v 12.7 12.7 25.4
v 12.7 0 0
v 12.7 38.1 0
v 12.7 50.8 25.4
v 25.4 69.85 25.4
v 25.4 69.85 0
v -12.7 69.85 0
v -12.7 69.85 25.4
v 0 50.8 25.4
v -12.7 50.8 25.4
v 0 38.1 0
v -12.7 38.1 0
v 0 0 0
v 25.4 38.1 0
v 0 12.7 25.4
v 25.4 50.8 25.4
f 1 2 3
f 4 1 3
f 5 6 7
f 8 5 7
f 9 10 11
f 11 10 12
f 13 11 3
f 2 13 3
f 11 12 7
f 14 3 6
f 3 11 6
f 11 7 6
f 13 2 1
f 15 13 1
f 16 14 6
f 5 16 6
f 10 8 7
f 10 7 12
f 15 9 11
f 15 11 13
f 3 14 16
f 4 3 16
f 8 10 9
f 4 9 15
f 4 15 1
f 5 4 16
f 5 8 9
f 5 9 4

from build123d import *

# Parameters (mm, degrees)
F1_DEPTH = 25.4
F3_DEPTH = 12.7
F5_DEPTH = 12.7
F7_DEPTH = 12.7


with BuildPart() as f1:
    # F0 (on Top) → F1 (new body)
    with BuildSketch(Plane.XY):
        Polygon((0, 38.1), (0, 0), (12.7, 0), (12.7, 38.1), (25.4, 38.1), (25.4, 69.85), (-12.7, 69.85), (-12.7, 38.1), align=None)
    extrude(amount=F1_DEPTH)

    # F2 (on face) → F3 (cut)
    with BuildSketch(Plane(origin=(-12.7, 0, 0), x_dir=(0, -1, 0), z_dir=(-1, 0, 0))):
        Polygon((-50.8, 25.4), (-38.1, 0), (-38.1, 25.4), align=None)
    extrude(amount=-F3_DEPTH, mode=Mode.SUBTRACT)

    # F4 (on face) → F5 (cut)
    with BuildSketch(Plane.YZ.offset(25.4)):
        Polygon((50.8, 25.4), (38.1, 25.4), (38.1, 0), align=None)
    extrude(amount=-F5_DEPTH, mode=Mode.SUBTRACT)

    # F6 (on face) → F7 (cut)
    with BuildSketch(Plane.YZ.offset(12.7)):
        Polygon((12.7, 25.4), (0, 25.4), (0, 0), align=None)
    extrude(amount=-F7_DEPTH, mode=Mode.SUBTRACT)


solid = f1.part
